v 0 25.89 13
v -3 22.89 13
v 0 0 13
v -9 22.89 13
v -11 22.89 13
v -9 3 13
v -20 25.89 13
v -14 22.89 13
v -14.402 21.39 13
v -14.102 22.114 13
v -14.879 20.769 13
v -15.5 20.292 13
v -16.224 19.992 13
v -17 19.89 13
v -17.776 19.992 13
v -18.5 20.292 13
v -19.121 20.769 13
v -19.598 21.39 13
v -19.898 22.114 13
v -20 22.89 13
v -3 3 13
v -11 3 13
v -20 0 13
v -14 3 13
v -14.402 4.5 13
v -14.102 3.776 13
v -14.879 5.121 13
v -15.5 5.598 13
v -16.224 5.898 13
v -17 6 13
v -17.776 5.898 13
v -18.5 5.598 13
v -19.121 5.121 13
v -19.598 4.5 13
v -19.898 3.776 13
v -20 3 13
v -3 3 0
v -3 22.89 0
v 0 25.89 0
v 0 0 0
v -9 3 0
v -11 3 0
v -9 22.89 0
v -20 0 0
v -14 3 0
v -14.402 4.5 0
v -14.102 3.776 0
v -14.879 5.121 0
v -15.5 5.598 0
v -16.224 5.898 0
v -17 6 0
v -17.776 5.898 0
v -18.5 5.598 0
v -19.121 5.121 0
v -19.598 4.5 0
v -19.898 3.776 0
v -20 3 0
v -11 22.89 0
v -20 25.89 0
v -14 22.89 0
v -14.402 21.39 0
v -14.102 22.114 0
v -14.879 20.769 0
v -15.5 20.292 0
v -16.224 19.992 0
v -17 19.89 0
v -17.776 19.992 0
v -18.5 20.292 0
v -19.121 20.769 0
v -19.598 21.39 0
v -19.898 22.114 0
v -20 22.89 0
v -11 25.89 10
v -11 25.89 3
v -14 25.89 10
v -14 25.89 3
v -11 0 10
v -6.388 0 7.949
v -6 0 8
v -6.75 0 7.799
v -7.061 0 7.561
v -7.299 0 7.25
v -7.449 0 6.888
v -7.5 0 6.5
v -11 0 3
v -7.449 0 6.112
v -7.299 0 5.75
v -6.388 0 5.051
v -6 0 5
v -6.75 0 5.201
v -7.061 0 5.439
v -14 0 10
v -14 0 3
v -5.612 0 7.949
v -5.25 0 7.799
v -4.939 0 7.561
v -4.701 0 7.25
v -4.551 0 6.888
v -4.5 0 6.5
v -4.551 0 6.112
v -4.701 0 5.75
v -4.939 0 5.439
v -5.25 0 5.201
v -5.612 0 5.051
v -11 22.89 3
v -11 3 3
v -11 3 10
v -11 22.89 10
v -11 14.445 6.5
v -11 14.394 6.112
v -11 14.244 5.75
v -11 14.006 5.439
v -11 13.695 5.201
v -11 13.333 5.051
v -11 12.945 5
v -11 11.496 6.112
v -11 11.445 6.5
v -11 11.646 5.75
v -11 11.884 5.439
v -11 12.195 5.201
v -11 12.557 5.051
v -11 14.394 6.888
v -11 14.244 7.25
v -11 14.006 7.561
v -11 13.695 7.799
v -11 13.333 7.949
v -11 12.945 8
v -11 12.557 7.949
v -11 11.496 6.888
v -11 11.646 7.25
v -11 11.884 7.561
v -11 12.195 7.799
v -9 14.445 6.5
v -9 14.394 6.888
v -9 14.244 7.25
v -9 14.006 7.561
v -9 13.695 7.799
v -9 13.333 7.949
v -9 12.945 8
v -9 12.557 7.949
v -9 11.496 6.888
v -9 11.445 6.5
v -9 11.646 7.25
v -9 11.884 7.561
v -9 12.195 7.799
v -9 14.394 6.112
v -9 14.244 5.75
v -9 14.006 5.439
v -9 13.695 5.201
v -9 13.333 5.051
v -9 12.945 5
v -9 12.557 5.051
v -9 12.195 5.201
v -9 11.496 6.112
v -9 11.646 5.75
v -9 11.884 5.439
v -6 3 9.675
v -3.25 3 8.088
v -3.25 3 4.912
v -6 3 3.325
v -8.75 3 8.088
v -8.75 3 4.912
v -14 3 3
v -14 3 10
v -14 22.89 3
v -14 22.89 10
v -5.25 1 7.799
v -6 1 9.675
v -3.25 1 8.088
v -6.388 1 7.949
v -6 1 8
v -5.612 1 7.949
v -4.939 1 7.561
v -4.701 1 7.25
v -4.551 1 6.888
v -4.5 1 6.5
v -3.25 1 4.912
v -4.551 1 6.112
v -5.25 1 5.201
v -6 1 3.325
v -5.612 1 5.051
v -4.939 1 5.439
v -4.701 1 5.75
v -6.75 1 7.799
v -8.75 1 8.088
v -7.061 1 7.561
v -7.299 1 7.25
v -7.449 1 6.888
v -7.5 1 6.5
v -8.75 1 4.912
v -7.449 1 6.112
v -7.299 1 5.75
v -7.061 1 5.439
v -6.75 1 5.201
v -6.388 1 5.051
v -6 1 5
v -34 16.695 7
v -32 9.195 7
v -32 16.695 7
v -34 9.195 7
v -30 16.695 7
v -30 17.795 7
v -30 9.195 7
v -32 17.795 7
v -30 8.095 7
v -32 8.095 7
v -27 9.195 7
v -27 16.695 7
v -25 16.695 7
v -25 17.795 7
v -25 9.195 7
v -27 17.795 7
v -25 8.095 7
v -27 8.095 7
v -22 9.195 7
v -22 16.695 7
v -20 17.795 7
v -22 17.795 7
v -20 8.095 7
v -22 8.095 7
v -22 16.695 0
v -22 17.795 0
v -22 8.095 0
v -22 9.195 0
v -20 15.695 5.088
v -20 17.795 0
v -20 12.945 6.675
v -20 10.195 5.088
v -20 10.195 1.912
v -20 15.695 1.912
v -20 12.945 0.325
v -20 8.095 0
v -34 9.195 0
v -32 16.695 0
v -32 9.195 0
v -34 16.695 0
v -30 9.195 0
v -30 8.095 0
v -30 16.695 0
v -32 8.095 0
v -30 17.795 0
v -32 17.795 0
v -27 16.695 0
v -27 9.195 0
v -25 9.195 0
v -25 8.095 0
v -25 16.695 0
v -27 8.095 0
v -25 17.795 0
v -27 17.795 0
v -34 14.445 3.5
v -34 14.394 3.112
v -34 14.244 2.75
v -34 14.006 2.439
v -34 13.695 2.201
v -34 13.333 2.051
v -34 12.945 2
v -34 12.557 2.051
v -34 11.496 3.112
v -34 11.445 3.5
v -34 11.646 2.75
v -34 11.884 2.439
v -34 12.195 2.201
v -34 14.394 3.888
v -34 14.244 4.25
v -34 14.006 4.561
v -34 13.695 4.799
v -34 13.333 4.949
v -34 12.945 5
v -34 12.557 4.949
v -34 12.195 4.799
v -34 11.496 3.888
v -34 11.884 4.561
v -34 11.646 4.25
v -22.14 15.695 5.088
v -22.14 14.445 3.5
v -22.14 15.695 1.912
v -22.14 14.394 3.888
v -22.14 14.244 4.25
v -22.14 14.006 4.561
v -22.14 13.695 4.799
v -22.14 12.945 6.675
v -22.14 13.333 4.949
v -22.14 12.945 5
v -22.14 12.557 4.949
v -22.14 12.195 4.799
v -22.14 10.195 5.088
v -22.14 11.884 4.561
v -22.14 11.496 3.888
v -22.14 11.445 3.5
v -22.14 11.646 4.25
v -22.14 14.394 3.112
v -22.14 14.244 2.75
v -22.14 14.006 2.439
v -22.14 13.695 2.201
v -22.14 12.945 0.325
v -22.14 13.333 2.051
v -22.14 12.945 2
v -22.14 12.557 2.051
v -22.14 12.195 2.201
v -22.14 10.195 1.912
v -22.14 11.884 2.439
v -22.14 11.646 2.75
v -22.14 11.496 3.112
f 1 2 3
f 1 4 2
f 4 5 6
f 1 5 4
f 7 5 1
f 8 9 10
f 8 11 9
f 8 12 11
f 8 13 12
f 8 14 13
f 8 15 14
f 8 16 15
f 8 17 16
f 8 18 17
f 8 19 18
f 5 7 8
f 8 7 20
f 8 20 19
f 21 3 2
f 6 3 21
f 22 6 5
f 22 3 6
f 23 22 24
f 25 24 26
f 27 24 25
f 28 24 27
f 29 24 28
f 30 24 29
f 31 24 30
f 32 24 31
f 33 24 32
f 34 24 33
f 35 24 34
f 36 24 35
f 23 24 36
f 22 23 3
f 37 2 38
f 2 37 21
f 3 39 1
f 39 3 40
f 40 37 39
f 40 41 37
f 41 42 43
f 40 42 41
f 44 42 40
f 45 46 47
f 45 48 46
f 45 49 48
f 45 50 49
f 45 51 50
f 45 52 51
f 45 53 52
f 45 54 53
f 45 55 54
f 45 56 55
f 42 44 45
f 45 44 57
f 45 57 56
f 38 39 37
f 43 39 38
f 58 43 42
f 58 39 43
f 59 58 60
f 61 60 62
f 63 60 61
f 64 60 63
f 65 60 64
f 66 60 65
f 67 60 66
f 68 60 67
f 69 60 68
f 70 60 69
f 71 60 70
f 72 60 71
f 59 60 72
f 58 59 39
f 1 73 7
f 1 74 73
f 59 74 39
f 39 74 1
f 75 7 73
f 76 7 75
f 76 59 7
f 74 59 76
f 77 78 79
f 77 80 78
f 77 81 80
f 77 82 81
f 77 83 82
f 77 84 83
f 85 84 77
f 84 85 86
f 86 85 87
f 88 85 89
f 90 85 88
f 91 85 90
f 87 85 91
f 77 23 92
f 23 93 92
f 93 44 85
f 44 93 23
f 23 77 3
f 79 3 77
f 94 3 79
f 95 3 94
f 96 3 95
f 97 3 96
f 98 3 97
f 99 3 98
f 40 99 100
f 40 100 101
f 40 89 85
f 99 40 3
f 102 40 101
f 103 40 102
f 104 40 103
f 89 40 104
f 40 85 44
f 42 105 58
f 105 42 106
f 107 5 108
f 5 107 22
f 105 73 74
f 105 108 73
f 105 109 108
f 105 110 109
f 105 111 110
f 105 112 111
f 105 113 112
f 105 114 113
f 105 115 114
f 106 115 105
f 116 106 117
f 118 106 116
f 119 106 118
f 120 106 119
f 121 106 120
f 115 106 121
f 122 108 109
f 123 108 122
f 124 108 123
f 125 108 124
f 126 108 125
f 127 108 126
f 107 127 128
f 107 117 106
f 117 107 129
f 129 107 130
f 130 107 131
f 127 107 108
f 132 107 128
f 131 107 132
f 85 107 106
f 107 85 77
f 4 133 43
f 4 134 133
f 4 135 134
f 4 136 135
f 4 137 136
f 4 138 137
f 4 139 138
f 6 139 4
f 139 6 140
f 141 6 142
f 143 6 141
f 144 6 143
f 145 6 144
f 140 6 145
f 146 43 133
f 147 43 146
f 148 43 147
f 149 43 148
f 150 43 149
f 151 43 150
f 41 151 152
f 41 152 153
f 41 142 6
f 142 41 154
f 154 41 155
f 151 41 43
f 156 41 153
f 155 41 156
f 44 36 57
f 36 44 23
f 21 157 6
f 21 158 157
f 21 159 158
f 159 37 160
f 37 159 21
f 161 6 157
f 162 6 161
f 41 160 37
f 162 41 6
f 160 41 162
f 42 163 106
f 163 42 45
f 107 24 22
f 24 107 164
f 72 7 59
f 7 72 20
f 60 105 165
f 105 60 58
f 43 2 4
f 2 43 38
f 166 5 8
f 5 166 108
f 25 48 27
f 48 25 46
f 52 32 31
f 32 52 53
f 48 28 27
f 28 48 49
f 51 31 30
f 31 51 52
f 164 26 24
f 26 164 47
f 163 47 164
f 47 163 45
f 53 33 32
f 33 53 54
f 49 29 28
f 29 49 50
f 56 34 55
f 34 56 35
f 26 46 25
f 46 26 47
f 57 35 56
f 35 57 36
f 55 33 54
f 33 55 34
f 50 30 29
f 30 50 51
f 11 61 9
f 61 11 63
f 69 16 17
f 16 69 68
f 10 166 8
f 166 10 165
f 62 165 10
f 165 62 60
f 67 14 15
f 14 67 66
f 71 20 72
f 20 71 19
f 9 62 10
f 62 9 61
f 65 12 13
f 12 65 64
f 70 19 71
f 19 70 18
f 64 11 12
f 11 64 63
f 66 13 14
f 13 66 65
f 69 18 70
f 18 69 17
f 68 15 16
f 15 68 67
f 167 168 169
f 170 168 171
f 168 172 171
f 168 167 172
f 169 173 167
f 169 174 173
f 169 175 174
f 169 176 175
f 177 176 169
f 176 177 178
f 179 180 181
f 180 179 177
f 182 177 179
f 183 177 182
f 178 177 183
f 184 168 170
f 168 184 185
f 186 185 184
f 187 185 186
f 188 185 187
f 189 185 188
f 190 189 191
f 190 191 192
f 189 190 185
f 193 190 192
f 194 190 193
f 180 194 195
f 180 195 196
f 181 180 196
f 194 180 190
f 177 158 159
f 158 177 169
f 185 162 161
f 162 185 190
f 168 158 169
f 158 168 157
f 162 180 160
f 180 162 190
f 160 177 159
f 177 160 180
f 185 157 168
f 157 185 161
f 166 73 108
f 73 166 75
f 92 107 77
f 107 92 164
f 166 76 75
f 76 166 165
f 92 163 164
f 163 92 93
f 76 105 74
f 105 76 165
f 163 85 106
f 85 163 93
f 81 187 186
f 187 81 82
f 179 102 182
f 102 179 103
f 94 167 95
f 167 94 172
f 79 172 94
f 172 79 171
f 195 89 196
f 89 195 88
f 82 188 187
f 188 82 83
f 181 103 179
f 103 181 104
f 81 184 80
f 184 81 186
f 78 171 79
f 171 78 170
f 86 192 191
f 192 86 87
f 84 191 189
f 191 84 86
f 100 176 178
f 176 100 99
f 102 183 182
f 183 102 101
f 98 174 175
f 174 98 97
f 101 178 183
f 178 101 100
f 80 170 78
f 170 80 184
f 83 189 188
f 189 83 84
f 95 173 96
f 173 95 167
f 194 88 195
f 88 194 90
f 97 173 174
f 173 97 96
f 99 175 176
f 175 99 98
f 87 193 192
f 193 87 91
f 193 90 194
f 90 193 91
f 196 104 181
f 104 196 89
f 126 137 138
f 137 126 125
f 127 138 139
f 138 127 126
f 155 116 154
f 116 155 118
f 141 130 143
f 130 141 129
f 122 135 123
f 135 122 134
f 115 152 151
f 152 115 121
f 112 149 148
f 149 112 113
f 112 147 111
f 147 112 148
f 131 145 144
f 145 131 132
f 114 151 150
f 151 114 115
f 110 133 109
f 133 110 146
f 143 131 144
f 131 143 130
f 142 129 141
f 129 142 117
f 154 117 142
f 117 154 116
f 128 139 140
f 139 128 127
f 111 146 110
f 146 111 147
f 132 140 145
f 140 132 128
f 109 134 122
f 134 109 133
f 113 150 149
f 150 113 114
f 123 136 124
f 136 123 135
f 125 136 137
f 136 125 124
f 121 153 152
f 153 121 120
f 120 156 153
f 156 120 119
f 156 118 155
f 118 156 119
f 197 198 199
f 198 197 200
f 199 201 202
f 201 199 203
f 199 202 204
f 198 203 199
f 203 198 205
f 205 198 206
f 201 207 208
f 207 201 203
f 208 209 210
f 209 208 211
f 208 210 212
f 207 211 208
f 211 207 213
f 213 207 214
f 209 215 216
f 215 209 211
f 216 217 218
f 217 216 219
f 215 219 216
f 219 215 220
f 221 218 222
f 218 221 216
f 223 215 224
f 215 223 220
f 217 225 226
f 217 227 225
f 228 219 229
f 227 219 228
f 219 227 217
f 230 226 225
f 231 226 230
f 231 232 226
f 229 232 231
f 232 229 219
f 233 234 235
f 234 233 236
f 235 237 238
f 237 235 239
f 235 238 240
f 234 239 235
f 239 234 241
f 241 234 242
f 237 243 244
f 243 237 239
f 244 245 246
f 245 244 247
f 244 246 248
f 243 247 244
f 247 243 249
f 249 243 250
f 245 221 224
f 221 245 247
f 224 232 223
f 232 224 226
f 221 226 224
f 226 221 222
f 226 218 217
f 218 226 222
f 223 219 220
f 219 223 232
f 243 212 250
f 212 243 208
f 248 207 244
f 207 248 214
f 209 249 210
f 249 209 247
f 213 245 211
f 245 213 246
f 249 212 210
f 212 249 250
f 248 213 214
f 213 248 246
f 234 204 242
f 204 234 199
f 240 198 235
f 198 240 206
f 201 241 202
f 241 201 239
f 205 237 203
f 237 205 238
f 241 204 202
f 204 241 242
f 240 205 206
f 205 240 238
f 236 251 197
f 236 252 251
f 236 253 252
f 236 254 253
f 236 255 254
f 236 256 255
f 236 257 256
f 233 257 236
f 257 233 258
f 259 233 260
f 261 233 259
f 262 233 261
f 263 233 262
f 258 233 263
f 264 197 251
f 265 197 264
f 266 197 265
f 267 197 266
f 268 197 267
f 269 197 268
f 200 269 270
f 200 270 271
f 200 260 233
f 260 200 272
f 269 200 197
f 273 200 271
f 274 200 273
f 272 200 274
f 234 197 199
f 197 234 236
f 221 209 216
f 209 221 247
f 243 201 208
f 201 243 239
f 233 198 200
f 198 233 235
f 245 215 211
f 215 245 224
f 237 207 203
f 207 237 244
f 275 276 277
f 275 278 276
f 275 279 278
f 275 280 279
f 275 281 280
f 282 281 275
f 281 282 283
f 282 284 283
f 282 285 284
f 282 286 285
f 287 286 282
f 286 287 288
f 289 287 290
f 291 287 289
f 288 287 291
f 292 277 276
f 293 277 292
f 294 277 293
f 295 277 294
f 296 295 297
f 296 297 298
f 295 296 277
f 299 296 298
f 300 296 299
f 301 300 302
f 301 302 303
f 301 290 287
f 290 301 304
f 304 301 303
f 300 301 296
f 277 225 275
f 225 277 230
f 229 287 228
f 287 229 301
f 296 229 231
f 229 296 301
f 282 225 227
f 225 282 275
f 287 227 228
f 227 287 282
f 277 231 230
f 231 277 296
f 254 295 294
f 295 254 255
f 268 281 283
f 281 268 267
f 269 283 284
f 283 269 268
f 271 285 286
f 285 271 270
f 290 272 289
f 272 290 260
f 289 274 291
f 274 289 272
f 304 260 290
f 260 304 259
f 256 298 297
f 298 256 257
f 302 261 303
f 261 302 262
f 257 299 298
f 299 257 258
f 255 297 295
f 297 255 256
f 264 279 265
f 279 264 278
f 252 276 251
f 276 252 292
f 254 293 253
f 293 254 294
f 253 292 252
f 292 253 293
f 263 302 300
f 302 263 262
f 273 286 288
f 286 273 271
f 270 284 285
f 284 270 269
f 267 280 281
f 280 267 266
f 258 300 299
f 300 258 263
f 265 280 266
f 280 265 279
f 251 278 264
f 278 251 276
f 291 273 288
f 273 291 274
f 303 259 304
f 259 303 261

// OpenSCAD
// [FL_INDEX: keywords="openscad, 3d_parametric, adjustable_printrbot_x-axis_tensioner, csg_solid" | COT="Parametric OpenSCAD design from 3DCodeverse"]
// Title: adjustable printrbot x-axis tensioner

// author: clayb.rpi@gmail.com
// date: 2013-02-20
// units: mm
//
// description: A X-axis tensioner for the original printed printrbot.
//
// extra hardware needed:
//   - 2 M4 machine screws + nuts (JIS)
//   - 1 small ziptie

/*******************
 * measured values *
 *******************/

// How wide the belt is
BELT_WIDTH = 7;

// The thickness of the belt.
BELT_THICKNESS = 3;

// The depth of the gaps in the belt.
BELT_GAP_DEPTH = 1.1;

// The width of the gaps in the belt.
BELT_GAP_WIDTH = 2;

// The distance between repeated features in the belt.
BELT_GAP_SPACING = 5;

// How wide the mounting point is.
MOUNT_WIDTH = 17.75;

// How deep the mounting point is (only used for visualization).
MOUNT_DEPTH = 20;

// How high the mounting point is.
MOUNT_HEIGHT = 6;

// The side-size of the inner mounting point sqare (only used for visualization).
MOUNT_INNER_SQUARE = 7;

// How thick the walls should be.
WALL_THICKNESS = 3;

// How thick any bracing walls should be.
THIN_WALL_THICKNESS = 2;

// The diameter of the screws to be used.
SCREW_HOLE_DIAMETER= 3;

// The width of the nuts to be used as measured from flat sides.
NUT_SHORT_WIDTH = 5.5;

// The height of the nuts to be used.
NUT_HEIGHT = 2.14;


/*********************
 * calculated values *
 *********************/
$fn=24 + 0;

TOP_PART_WIDTH = max(NUT_SHORT_WIDTH + THIN_WALL_THICKNESS, WALL_THICKNESS);
TOP_PART_HEIGHT = 2 * BELT_WIDTH;

BOTTOM_HEIGHT = MOUNT_HEIGHT + BELT_THICKNESS + 3 * WALL_THICKNESS + THIN_WALL_THICKNESS;
BOTTOM_WIDTH = max(
    /* mount is the limiting factor */ MOUNT_WIDTH + 2 * WALL_THICKNESS + NUT_HEIGHT,
    /* if we have thick belts */ TOP_PART_WIDTH + 2 * BELT_THICKNESS + 4 * WALL_THICKNESS);
BOTTOM_DEPTH = BELT_WIDTH + 2 * WALL_THICKNESS;


/*
 * A small piece to actually grip the belt for tensioning.
 */
module top_piece() {
  difference() {
    union() {
      cube([BELT_WIDTH, TOP_PART_WIDTH, TOP_PART_HEIGHT]);
      for (h = [0 : BELT_GAP_SPACING : 2 * BELT_WIDTH - BELT_GAP_WIDTH]) {
        translate([0, -BELT_GAP_DEPTH, h])
        cube([BELT_WIDTH, TOP_PART_WIDTH + 2 * BELT_GAP_DEPTH, BELT_GAP_WIDTH]);
      }
    }

    // cut out slots for the tensioner nut and screw.
    translate([BELT_WIDTH / 2, TOP_PART_WIDTH / 2, -1])
    nut_hole(h = NUT_HEIGHT + 1);

    translate([BELT_WIDTH / 2, TOP_PART_WIDTH / 2, -1])
    cylinder(r = SCREW_HOLE_DIAMETER / 2, h = TOP_PART_HEIGHT + 2);
  }
}

/*
 * The bottom bracket piece of the tensioner.
 */
module bottom_piece() {
  difference() {
    union() {
      // bottom side.
      cube([BOTTOM_DEPTH, BOTTOM_WIDTH, WALL_THICKNESS]);

      // support beam.
      translate([0, 0, WALL_THICKNESS + MOUNT_HEIGHT])
      cube([BOTTOM_DEPTH, BOTTOM_WIDTH, THIN_WALL_THICKNESS]);

      // fill in the area around the mounting point.
      if (BOTTOM_WIDTH - 2 * WALL_THICKNESS - MOUNT_WIDTH -0.001 > NUT_HEIGHT) {
        translate([0, WALL_THICKNESS + NUT_HEIGHT + MOUNT_WIDTH, WALL_THICKNESS])
        cube([BOTTOM_DEPTH, BOTTOM_WIDTH - 2 * WALL_THICKNESS - MOUNT_WIDTH - NUT_HEIGHT, MOUNT_HEIGHT]);
      }

      // sides.
      cube([BOTTOM_DEPTH, WALL_THICKNESS, BOTTOM_HEIGHT]);

      translate([0, BOTTOM_WIDTH - WALL_THICKNESS])
      cube([BOTTOM_DEPTH, WALL_THICKNESS, BOTTOM_HEIGHT]);

      // Rounded areas for the bet interface.
      translate([0, WALL_THICKNESS, BOTTOM_HEIGHT - WALL_THICKNESS])
      rotate([0, 90, 0])
      cylinder(r=WALL_THICKNESS, h=BOTTOM_DEPTH);

      translate([0, BOTTOM_WIDTH - WALL_THICKNESS, BOTTOM_HEIGHT - WALL_THICKNESS])
      rotate([0, 90, 0])
      cylinder(r=WALL_THICKNESS, h=BOTTOM_DEPTH);
    }

    // cut out a hole for the belt.
    translate([WALL_THICKNESS, -1, WALL_THICKNESS + MOUNT_HEIGHT + THIN_WALL_THICKNESS])
    cube([BELT_WIDTH, BOTTOM_WIDTH + 2, BELT_THICKNESS]);

    // cut out a hole for the bracing screw.
    translate([BOTTOM_DEPTH / 2, -1, WALL_THICKNESS + MOUNT_HEIGHT / 2])
    rotate([-90, 0, 0])
    cylinder(r=SCREW_HOLE_DIAMETER / 2, h=WALL_THICKNESS + 2);

    translate([BOTTOM_DEPTH / 2, WALL_THICKNESS - THIN_WALL_THICKNESS, WALL_THICKNESS + MOUNT_HEIGHT / 2])
    rotate([-90, 0, 0])
    nut_hole(h=2 * NUT_HEIGHT);

    // cut out a hole for the tensioning screw.
    translate([BOTTOM_DEPTH / 2, BOTTOM_WIDTH / 2, WALL_THICKNESS + MOUNT_HEIGHT - 1])
    cylinder(r=SCREW_HOLE_DIAMETER / 2, h=THIN_WALL_THICKNESS + 2);
  }
}

/*
 * A representation of the mounting point on the printrbot for this part.
 */
module mounting_point() {
  difference() {
  	cube([MOUNT_DEPTH, MOUNT_WIDTH, MOUNT_HEIGHT]);

    translate([MOUNT_DEPTH - MOUNT_INNER_SQUARE - 6, (MOUNT_WIDTH - MOUNT_INNER_SQUARE) / 2, -1])
    cube([MOUNT_INNER_SQUARE, MOUNT_INNER_SQUARE, MOUNT_HEIGHT +  2]);
  }
}

/*
 * A cutaway for a nut as measured from the flat sides.
 */
module nut_hole(short_width=NUT_SHORT_WIDTH, h=NUT_HEIGHT) {
  translate([0, 0, h / 2])
  union() {
    for(r = [0, 120, 240]) {
      rotate([0, 0, r])
      cube([(short_width / 2) / cos(30), short_width, h], center=true);
    }
  }
}

/*
 * A module to render all of the pieces in their assembled form.
 */
module pieces_arranged_for_display() {
  bottom_piece();

  translate([WALL_THICKNESS, (BOTTOM_WIDTH - TOP_PART_WIDTH) / 2,
             WALL_THICKNESS + MOUNT_HEIGHT + THIN_WALL_THICKNESS + BELT_THICKNESS])
  top_piece();

  %
  // Visualize the mounting point on the printrbot.
  translate([BOTTOM_DEPTH - MOUNT_DEPTH, WALL_THICKNESS + NUT_HEIGHT, WALL_THICKNESS])
  mounting_point();
}

/*
 * A module to render all of the pieces in their printable form.
 */
module pieces_arranged_for_printing() {
  rotate([0, -90, 0])
  bottom_piece();

  translate([-BOTTOM_HEIGHT, (BOTTOM_WIDTH - TOP_PART_WIDTH) / 2, 0])
  rotate([0, -90, 0])
  top_piece();
}

// pieces_arranged_for_display();
pieces_arranged_for_printing();
